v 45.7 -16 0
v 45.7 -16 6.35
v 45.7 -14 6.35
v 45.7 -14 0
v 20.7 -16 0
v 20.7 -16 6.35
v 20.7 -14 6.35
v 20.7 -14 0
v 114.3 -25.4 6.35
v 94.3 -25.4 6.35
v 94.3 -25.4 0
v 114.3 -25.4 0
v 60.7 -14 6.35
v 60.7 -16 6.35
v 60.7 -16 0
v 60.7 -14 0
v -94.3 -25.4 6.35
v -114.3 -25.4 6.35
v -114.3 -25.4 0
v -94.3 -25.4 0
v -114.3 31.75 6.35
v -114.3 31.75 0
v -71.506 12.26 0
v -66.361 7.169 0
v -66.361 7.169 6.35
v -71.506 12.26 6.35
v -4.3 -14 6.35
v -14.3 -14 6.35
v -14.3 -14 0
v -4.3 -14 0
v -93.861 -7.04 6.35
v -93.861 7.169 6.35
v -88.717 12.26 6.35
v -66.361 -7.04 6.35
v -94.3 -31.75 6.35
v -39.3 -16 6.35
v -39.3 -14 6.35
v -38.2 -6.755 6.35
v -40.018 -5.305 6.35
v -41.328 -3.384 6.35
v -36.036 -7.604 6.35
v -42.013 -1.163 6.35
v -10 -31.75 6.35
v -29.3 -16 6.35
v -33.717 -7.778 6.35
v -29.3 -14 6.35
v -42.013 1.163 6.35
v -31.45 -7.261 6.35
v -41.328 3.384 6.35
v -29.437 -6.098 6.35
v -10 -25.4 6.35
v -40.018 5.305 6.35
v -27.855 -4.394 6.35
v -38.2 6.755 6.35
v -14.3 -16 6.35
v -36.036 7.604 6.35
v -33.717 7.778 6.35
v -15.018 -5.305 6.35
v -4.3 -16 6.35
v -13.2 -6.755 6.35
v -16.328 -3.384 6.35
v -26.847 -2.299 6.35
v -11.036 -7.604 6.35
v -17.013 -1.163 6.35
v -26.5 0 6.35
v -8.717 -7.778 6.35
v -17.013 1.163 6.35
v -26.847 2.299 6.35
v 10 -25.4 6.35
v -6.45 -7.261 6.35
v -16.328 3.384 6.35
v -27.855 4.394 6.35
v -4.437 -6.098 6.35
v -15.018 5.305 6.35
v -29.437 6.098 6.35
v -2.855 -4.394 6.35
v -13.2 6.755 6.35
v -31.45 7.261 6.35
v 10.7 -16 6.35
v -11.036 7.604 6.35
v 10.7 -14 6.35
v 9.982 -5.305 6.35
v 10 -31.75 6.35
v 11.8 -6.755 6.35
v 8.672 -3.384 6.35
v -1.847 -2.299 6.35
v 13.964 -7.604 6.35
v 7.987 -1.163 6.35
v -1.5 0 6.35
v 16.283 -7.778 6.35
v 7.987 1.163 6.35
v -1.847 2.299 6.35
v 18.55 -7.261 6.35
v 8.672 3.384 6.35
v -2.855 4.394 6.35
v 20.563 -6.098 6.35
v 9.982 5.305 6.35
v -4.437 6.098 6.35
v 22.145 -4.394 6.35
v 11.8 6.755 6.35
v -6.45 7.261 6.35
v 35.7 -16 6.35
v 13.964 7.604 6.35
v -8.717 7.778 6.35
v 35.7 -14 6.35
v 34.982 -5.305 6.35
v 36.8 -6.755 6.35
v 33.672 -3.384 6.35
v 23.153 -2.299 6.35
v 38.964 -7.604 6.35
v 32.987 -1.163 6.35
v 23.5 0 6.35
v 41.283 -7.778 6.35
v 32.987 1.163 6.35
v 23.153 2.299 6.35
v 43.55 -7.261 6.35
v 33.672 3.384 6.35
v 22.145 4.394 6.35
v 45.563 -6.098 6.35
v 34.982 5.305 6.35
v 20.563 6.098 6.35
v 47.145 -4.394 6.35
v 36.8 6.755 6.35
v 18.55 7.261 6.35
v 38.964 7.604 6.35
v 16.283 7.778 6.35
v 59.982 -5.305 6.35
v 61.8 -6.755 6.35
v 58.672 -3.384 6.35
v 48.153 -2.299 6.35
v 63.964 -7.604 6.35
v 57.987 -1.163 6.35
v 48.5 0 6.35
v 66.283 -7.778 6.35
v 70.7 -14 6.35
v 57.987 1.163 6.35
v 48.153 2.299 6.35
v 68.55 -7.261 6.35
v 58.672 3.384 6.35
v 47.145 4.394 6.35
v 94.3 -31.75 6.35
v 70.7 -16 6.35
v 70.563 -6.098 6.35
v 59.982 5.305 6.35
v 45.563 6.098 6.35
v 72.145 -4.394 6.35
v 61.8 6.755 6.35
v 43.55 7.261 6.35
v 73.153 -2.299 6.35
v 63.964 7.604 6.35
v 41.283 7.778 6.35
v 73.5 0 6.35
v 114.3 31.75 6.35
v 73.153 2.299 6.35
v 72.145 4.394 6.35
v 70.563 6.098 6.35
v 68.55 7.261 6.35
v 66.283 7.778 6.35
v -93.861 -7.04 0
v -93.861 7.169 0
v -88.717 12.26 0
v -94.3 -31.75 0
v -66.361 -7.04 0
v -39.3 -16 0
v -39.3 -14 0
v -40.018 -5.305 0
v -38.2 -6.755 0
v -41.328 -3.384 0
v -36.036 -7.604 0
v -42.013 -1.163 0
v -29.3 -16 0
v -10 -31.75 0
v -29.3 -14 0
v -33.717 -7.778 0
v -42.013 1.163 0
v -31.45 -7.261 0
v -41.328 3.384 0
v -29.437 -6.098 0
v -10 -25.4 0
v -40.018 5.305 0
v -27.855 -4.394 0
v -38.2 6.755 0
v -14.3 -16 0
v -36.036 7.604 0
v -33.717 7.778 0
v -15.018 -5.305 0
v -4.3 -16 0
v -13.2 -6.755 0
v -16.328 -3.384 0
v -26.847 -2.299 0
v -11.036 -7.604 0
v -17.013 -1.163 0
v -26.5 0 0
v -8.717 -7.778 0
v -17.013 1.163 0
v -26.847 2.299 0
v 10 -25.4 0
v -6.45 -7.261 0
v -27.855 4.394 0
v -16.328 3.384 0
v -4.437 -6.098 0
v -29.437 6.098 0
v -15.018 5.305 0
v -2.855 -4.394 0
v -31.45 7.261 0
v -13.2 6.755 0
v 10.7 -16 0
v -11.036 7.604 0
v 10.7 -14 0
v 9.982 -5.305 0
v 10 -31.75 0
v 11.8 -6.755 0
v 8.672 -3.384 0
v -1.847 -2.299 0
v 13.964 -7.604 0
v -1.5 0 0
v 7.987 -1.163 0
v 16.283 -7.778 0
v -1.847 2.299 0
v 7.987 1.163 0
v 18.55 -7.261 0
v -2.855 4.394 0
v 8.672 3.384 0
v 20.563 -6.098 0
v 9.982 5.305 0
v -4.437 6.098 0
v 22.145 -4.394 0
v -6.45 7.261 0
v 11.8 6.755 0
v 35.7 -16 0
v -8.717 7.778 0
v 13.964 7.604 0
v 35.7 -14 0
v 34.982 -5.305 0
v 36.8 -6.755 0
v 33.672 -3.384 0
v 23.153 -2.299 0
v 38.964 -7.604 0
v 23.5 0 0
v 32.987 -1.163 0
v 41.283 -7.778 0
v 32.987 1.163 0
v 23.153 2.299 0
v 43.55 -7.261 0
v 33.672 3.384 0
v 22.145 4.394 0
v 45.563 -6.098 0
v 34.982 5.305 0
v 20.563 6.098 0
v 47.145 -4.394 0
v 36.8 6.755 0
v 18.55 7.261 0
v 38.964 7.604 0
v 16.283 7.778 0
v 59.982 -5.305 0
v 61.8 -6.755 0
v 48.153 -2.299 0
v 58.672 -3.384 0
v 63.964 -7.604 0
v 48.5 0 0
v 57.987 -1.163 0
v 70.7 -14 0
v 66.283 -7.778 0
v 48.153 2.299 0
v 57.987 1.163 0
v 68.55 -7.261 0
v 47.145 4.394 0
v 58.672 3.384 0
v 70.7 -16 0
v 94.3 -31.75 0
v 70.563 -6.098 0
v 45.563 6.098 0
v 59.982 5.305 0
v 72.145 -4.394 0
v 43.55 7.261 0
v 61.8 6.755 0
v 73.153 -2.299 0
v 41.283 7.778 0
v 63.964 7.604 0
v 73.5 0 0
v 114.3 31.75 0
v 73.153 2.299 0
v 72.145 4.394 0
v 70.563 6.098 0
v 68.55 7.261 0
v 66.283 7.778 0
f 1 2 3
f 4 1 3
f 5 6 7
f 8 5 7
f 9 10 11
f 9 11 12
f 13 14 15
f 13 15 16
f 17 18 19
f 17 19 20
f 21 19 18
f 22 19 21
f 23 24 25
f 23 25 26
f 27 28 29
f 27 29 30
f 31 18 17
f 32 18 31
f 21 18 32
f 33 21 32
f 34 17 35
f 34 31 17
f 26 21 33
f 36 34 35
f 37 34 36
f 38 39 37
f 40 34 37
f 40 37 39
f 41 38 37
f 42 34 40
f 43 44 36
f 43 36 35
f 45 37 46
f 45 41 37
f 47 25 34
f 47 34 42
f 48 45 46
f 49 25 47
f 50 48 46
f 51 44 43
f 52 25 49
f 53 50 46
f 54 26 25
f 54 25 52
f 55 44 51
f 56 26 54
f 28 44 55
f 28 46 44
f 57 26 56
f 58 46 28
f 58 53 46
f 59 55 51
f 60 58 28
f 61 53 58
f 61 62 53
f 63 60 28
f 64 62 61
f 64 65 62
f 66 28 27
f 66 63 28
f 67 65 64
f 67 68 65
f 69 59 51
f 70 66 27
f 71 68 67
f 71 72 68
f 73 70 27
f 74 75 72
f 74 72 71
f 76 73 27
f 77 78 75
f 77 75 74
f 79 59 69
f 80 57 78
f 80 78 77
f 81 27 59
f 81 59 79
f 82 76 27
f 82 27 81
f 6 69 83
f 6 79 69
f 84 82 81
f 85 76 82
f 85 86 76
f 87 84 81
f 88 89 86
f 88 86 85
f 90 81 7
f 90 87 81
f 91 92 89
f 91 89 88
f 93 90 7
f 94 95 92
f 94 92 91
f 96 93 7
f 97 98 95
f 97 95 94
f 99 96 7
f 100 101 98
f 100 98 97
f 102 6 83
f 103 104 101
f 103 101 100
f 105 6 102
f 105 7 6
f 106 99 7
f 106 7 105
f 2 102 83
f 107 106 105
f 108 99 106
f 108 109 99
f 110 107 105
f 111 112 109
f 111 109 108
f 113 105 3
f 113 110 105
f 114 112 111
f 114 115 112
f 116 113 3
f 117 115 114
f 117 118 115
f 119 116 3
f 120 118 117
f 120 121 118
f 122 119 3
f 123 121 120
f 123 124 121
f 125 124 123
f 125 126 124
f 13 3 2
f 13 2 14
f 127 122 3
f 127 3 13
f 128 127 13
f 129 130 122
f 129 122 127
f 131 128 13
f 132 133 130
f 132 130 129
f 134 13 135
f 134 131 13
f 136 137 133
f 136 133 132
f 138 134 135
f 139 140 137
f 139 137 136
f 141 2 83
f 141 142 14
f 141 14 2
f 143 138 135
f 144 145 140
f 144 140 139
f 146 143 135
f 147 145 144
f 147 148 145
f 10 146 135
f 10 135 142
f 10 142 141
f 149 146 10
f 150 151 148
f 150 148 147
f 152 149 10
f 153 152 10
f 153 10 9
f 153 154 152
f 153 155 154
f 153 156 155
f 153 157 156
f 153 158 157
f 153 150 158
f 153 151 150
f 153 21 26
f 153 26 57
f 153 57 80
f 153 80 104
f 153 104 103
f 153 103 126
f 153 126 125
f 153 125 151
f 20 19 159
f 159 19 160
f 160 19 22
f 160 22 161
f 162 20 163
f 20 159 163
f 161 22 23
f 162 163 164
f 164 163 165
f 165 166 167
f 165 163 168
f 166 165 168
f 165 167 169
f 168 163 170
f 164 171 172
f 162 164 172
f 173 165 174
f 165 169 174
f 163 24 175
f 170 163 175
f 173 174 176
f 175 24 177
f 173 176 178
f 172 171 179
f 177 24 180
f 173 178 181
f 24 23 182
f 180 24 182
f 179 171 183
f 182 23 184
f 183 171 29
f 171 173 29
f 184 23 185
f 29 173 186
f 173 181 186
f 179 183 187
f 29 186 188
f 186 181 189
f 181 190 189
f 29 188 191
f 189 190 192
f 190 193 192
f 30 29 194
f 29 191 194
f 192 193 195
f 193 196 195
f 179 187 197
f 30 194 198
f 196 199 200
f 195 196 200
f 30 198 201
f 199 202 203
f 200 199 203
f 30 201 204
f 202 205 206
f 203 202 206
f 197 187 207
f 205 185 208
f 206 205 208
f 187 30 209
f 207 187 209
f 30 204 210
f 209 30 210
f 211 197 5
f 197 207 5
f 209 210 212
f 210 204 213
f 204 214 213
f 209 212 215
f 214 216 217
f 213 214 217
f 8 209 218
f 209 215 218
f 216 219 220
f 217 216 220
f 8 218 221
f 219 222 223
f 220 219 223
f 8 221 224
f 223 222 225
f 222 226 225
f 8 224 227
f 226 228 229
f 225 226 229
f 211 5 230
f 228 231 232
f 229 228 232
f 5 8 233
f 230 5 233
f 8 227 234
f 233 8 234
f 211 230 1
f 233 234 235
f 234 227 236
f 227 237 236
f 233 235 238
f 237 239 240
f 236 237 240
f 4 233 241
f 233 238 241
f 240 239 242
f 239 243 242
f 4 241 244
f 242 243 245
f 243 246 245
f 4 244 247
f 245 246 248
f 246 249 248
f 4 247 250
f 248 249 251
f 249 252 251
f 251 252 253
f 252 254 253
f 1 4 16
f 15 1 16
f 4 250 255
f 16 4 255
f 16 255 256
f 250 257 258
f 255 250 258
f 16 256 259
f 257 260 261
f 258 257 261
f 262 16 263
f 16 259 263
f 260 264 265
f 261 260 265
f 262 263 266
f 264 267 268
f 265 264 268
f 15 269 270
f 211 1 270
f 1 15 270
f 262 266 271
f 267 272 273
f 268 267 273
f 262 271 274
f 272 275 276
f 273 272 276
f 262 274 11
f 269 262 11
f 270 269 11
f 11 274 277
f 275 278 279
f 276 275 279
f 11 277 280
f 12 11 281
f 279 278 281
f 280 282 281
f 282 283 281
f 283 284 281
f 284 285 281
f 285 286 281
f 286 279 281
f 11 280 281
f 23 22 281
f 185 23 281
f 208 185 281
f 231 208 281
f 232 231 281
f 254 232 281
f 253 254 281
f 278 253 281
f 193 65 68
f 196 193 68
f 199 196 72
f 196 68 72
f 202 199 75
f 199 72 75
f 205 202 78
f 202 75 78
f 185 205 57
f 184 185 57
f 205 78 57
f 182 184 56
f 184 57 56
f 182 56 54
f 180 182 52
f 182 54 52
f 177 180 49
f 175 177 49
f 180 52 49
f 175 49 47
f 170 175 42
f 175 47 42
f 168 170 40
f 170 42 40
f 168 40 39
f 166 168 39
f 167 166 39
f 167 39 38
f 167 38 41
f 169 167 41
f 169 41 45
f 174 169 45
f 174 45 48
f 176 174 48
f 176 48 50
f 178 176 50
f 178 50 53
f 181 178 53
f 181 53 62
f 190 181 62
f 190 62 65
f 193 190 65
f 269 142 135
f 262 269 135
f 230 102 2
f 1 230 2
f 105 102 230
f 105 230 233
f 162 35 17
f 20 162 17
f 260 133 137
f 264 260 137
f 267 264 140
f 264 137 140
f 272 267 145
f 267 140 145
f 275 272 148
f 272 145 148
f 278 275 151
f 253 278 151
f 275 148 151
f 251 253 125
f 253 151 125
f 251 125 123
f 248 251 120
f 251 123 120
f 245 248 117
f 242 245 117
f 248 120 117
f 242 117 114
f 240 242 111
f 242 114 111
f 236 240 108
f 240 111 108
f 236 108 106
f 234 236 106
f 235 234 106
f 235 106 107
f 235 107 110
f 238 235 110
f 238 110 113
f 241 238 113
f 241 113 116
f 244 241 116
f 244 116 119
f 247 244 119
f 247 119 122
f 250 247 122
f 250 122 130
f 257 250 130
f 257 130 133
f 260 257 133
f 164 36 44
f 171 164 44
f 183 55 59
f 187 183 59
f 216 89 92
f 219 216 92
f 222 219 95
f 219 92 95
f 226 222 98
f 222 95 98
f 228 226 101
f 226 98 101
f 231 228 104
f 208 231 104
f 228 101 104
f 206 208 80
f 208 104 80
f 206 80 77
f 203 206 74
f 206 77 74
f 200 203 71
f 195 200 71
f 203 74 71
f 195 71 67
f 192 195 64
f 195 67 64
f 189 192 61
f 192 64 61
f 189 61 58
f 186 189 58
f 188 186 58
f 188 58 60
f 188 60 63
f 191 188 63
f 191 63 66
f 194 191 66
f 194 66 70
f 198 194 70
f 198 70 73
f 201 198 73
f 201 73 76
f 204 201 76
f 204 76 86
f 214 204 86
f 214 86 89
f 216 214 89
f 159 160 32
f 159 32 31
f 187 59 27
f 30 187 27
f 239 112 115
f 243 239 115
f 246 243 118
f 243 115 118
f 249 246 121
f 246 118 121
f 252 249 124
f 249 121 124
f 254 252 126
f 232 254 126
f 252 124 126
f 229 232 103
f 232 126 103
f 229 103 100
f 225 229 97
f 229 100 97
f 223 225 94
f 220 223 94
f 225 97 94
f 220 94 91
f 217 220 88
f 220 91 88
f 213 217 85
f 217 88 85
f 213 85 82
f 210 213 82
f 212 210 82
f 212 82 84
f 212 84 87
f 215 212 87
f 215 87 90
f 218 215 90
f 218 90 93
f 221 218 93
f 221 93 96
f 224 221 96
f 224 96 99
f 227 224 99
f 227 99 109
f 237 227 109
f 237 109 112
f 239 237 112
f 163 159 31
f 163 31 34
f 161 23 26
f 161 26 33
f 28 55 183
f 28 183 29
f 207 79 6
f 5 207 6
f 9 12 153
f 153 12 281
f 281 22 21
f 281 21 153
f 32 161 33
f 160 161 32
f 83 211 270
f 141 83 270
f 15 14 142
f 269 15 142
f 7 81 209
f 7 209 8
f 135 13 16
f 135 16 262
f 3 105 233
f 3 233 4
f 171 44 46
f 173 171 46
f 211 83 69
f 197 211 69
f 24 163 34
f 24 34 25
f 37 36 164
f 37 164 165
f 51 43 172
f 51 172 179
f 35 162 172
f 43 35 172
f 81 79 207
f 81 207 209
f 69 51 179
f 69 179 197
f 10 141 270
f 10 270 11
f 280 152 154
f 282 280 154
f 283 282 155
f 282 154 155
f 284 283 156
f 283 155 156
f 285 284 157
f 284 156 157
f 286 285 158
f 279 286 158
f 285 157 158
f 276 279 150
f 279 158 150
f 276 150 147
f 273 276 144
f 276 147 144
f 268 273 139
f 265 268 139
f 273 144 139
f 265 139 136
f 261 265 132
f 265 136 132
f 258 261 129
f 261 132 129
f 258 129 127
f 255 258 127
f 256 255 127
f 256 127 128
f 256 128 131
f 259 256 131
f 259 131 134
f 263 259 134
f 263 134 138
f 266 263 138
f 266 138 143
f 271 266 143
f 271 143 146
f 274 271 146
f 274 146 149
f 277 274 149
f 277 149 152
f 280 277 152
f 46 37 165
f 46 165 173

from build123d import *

# Parameters (mm, degrees)
SKETCH1_W           = 228.6
SKETCH1_H           = 63.5
BOSS_EXTRUDE1_DEPTH = 6.35
SKETCH3_R           = 7.8
SKETCH3_W           = 20
SKETCH3_H           = 6.35
SKETCH3_W_2         = 10
SKETCH3_H_2         = 2
CUT_EXTRUDE1_DEPTH  = 119.79762203
CUT_EXTRUDE2_DEPTH  = 119.79762203


with BuildPart() as part:
    # Sketch1 → Boss-Extrude1 (new body)
    with BuildSketch(Plane.XY):
        Rectangle(SKETCH1_W, SKETCH1_H)
    extrude(amount=BOSS_EXTRUDE1_DEPTH)

    # Sketch3 → Cut-Extrude1 (cut, through all)
    with BuildSketch(Plane.XY.offset(6.35)):
        with Locations((-34.3, 0)):
            Circle(SKETCH3_R)
        with Locations((-9.3, 0)):
            Circle(SKETCH3_R)
        with Locations((15.7, 0)):
            Circle(SKETCH3_R)
        with Locations((40.7, 0)):
            Circle(SKETCH3_R)
        with Locations((65.7, 0)):
            Circle(SKETCH3_R)
        with Locations((-104.3, -28.575)):
            Rectangle(SKETCH3_W, SKETCH3_H)
        with Locations((0, -28.575)):
            Rectangle(SKETCH3_W, SKETCH3_H)
        with Locations((104.3, -28.575)):
            Rectangle(SKETCH3_W, SKETCH3_H)
        with Locations((-9.3, -15)):
            Rectangle(SKETCH3_W_2, SKETCH3_H_2)
        with Locations((-34.3, -15)):
            Rectangle(SKETCH3_W_2, SKETCH3_H_2)
        with Locations((15.7, -15)):
            Rectangle(SKETCH3_W_2, SKETCH3_H_2)
        with Locations((40.7, -15)):
            Rectangle(SKETCH3_W_2, SKETCH3_H_2)
        with Locations((65.7, -15)):
            Rectangle(SKETCH3_W_2, SKETCH3_H_2)
    extrude(amount=-CUT_EXTRUDE1_DEPTH, mode=Mode.SUBTRACT)

    # Sketch5 → Cut-Extrude2 (cut, through all)
    with BuildSketch(Plane(origin=(0, 0, 0), x_dir=(-1, 0, 0), z_dir=(0, 0, -1))):
        Polygon((93.861415546, -7.039545532), (66.361415546, -7.039545532), (66.361415546, 7.169080451), (71.505824709, 12.260454468), (88.717006383, 12.260454468), (93.861415546, 7.169080451), align=None)
    extrude(amount=-CUT_EXTRUDE2_DEPTH, mode=Mode.SUBTRACT)


solid = part.part
